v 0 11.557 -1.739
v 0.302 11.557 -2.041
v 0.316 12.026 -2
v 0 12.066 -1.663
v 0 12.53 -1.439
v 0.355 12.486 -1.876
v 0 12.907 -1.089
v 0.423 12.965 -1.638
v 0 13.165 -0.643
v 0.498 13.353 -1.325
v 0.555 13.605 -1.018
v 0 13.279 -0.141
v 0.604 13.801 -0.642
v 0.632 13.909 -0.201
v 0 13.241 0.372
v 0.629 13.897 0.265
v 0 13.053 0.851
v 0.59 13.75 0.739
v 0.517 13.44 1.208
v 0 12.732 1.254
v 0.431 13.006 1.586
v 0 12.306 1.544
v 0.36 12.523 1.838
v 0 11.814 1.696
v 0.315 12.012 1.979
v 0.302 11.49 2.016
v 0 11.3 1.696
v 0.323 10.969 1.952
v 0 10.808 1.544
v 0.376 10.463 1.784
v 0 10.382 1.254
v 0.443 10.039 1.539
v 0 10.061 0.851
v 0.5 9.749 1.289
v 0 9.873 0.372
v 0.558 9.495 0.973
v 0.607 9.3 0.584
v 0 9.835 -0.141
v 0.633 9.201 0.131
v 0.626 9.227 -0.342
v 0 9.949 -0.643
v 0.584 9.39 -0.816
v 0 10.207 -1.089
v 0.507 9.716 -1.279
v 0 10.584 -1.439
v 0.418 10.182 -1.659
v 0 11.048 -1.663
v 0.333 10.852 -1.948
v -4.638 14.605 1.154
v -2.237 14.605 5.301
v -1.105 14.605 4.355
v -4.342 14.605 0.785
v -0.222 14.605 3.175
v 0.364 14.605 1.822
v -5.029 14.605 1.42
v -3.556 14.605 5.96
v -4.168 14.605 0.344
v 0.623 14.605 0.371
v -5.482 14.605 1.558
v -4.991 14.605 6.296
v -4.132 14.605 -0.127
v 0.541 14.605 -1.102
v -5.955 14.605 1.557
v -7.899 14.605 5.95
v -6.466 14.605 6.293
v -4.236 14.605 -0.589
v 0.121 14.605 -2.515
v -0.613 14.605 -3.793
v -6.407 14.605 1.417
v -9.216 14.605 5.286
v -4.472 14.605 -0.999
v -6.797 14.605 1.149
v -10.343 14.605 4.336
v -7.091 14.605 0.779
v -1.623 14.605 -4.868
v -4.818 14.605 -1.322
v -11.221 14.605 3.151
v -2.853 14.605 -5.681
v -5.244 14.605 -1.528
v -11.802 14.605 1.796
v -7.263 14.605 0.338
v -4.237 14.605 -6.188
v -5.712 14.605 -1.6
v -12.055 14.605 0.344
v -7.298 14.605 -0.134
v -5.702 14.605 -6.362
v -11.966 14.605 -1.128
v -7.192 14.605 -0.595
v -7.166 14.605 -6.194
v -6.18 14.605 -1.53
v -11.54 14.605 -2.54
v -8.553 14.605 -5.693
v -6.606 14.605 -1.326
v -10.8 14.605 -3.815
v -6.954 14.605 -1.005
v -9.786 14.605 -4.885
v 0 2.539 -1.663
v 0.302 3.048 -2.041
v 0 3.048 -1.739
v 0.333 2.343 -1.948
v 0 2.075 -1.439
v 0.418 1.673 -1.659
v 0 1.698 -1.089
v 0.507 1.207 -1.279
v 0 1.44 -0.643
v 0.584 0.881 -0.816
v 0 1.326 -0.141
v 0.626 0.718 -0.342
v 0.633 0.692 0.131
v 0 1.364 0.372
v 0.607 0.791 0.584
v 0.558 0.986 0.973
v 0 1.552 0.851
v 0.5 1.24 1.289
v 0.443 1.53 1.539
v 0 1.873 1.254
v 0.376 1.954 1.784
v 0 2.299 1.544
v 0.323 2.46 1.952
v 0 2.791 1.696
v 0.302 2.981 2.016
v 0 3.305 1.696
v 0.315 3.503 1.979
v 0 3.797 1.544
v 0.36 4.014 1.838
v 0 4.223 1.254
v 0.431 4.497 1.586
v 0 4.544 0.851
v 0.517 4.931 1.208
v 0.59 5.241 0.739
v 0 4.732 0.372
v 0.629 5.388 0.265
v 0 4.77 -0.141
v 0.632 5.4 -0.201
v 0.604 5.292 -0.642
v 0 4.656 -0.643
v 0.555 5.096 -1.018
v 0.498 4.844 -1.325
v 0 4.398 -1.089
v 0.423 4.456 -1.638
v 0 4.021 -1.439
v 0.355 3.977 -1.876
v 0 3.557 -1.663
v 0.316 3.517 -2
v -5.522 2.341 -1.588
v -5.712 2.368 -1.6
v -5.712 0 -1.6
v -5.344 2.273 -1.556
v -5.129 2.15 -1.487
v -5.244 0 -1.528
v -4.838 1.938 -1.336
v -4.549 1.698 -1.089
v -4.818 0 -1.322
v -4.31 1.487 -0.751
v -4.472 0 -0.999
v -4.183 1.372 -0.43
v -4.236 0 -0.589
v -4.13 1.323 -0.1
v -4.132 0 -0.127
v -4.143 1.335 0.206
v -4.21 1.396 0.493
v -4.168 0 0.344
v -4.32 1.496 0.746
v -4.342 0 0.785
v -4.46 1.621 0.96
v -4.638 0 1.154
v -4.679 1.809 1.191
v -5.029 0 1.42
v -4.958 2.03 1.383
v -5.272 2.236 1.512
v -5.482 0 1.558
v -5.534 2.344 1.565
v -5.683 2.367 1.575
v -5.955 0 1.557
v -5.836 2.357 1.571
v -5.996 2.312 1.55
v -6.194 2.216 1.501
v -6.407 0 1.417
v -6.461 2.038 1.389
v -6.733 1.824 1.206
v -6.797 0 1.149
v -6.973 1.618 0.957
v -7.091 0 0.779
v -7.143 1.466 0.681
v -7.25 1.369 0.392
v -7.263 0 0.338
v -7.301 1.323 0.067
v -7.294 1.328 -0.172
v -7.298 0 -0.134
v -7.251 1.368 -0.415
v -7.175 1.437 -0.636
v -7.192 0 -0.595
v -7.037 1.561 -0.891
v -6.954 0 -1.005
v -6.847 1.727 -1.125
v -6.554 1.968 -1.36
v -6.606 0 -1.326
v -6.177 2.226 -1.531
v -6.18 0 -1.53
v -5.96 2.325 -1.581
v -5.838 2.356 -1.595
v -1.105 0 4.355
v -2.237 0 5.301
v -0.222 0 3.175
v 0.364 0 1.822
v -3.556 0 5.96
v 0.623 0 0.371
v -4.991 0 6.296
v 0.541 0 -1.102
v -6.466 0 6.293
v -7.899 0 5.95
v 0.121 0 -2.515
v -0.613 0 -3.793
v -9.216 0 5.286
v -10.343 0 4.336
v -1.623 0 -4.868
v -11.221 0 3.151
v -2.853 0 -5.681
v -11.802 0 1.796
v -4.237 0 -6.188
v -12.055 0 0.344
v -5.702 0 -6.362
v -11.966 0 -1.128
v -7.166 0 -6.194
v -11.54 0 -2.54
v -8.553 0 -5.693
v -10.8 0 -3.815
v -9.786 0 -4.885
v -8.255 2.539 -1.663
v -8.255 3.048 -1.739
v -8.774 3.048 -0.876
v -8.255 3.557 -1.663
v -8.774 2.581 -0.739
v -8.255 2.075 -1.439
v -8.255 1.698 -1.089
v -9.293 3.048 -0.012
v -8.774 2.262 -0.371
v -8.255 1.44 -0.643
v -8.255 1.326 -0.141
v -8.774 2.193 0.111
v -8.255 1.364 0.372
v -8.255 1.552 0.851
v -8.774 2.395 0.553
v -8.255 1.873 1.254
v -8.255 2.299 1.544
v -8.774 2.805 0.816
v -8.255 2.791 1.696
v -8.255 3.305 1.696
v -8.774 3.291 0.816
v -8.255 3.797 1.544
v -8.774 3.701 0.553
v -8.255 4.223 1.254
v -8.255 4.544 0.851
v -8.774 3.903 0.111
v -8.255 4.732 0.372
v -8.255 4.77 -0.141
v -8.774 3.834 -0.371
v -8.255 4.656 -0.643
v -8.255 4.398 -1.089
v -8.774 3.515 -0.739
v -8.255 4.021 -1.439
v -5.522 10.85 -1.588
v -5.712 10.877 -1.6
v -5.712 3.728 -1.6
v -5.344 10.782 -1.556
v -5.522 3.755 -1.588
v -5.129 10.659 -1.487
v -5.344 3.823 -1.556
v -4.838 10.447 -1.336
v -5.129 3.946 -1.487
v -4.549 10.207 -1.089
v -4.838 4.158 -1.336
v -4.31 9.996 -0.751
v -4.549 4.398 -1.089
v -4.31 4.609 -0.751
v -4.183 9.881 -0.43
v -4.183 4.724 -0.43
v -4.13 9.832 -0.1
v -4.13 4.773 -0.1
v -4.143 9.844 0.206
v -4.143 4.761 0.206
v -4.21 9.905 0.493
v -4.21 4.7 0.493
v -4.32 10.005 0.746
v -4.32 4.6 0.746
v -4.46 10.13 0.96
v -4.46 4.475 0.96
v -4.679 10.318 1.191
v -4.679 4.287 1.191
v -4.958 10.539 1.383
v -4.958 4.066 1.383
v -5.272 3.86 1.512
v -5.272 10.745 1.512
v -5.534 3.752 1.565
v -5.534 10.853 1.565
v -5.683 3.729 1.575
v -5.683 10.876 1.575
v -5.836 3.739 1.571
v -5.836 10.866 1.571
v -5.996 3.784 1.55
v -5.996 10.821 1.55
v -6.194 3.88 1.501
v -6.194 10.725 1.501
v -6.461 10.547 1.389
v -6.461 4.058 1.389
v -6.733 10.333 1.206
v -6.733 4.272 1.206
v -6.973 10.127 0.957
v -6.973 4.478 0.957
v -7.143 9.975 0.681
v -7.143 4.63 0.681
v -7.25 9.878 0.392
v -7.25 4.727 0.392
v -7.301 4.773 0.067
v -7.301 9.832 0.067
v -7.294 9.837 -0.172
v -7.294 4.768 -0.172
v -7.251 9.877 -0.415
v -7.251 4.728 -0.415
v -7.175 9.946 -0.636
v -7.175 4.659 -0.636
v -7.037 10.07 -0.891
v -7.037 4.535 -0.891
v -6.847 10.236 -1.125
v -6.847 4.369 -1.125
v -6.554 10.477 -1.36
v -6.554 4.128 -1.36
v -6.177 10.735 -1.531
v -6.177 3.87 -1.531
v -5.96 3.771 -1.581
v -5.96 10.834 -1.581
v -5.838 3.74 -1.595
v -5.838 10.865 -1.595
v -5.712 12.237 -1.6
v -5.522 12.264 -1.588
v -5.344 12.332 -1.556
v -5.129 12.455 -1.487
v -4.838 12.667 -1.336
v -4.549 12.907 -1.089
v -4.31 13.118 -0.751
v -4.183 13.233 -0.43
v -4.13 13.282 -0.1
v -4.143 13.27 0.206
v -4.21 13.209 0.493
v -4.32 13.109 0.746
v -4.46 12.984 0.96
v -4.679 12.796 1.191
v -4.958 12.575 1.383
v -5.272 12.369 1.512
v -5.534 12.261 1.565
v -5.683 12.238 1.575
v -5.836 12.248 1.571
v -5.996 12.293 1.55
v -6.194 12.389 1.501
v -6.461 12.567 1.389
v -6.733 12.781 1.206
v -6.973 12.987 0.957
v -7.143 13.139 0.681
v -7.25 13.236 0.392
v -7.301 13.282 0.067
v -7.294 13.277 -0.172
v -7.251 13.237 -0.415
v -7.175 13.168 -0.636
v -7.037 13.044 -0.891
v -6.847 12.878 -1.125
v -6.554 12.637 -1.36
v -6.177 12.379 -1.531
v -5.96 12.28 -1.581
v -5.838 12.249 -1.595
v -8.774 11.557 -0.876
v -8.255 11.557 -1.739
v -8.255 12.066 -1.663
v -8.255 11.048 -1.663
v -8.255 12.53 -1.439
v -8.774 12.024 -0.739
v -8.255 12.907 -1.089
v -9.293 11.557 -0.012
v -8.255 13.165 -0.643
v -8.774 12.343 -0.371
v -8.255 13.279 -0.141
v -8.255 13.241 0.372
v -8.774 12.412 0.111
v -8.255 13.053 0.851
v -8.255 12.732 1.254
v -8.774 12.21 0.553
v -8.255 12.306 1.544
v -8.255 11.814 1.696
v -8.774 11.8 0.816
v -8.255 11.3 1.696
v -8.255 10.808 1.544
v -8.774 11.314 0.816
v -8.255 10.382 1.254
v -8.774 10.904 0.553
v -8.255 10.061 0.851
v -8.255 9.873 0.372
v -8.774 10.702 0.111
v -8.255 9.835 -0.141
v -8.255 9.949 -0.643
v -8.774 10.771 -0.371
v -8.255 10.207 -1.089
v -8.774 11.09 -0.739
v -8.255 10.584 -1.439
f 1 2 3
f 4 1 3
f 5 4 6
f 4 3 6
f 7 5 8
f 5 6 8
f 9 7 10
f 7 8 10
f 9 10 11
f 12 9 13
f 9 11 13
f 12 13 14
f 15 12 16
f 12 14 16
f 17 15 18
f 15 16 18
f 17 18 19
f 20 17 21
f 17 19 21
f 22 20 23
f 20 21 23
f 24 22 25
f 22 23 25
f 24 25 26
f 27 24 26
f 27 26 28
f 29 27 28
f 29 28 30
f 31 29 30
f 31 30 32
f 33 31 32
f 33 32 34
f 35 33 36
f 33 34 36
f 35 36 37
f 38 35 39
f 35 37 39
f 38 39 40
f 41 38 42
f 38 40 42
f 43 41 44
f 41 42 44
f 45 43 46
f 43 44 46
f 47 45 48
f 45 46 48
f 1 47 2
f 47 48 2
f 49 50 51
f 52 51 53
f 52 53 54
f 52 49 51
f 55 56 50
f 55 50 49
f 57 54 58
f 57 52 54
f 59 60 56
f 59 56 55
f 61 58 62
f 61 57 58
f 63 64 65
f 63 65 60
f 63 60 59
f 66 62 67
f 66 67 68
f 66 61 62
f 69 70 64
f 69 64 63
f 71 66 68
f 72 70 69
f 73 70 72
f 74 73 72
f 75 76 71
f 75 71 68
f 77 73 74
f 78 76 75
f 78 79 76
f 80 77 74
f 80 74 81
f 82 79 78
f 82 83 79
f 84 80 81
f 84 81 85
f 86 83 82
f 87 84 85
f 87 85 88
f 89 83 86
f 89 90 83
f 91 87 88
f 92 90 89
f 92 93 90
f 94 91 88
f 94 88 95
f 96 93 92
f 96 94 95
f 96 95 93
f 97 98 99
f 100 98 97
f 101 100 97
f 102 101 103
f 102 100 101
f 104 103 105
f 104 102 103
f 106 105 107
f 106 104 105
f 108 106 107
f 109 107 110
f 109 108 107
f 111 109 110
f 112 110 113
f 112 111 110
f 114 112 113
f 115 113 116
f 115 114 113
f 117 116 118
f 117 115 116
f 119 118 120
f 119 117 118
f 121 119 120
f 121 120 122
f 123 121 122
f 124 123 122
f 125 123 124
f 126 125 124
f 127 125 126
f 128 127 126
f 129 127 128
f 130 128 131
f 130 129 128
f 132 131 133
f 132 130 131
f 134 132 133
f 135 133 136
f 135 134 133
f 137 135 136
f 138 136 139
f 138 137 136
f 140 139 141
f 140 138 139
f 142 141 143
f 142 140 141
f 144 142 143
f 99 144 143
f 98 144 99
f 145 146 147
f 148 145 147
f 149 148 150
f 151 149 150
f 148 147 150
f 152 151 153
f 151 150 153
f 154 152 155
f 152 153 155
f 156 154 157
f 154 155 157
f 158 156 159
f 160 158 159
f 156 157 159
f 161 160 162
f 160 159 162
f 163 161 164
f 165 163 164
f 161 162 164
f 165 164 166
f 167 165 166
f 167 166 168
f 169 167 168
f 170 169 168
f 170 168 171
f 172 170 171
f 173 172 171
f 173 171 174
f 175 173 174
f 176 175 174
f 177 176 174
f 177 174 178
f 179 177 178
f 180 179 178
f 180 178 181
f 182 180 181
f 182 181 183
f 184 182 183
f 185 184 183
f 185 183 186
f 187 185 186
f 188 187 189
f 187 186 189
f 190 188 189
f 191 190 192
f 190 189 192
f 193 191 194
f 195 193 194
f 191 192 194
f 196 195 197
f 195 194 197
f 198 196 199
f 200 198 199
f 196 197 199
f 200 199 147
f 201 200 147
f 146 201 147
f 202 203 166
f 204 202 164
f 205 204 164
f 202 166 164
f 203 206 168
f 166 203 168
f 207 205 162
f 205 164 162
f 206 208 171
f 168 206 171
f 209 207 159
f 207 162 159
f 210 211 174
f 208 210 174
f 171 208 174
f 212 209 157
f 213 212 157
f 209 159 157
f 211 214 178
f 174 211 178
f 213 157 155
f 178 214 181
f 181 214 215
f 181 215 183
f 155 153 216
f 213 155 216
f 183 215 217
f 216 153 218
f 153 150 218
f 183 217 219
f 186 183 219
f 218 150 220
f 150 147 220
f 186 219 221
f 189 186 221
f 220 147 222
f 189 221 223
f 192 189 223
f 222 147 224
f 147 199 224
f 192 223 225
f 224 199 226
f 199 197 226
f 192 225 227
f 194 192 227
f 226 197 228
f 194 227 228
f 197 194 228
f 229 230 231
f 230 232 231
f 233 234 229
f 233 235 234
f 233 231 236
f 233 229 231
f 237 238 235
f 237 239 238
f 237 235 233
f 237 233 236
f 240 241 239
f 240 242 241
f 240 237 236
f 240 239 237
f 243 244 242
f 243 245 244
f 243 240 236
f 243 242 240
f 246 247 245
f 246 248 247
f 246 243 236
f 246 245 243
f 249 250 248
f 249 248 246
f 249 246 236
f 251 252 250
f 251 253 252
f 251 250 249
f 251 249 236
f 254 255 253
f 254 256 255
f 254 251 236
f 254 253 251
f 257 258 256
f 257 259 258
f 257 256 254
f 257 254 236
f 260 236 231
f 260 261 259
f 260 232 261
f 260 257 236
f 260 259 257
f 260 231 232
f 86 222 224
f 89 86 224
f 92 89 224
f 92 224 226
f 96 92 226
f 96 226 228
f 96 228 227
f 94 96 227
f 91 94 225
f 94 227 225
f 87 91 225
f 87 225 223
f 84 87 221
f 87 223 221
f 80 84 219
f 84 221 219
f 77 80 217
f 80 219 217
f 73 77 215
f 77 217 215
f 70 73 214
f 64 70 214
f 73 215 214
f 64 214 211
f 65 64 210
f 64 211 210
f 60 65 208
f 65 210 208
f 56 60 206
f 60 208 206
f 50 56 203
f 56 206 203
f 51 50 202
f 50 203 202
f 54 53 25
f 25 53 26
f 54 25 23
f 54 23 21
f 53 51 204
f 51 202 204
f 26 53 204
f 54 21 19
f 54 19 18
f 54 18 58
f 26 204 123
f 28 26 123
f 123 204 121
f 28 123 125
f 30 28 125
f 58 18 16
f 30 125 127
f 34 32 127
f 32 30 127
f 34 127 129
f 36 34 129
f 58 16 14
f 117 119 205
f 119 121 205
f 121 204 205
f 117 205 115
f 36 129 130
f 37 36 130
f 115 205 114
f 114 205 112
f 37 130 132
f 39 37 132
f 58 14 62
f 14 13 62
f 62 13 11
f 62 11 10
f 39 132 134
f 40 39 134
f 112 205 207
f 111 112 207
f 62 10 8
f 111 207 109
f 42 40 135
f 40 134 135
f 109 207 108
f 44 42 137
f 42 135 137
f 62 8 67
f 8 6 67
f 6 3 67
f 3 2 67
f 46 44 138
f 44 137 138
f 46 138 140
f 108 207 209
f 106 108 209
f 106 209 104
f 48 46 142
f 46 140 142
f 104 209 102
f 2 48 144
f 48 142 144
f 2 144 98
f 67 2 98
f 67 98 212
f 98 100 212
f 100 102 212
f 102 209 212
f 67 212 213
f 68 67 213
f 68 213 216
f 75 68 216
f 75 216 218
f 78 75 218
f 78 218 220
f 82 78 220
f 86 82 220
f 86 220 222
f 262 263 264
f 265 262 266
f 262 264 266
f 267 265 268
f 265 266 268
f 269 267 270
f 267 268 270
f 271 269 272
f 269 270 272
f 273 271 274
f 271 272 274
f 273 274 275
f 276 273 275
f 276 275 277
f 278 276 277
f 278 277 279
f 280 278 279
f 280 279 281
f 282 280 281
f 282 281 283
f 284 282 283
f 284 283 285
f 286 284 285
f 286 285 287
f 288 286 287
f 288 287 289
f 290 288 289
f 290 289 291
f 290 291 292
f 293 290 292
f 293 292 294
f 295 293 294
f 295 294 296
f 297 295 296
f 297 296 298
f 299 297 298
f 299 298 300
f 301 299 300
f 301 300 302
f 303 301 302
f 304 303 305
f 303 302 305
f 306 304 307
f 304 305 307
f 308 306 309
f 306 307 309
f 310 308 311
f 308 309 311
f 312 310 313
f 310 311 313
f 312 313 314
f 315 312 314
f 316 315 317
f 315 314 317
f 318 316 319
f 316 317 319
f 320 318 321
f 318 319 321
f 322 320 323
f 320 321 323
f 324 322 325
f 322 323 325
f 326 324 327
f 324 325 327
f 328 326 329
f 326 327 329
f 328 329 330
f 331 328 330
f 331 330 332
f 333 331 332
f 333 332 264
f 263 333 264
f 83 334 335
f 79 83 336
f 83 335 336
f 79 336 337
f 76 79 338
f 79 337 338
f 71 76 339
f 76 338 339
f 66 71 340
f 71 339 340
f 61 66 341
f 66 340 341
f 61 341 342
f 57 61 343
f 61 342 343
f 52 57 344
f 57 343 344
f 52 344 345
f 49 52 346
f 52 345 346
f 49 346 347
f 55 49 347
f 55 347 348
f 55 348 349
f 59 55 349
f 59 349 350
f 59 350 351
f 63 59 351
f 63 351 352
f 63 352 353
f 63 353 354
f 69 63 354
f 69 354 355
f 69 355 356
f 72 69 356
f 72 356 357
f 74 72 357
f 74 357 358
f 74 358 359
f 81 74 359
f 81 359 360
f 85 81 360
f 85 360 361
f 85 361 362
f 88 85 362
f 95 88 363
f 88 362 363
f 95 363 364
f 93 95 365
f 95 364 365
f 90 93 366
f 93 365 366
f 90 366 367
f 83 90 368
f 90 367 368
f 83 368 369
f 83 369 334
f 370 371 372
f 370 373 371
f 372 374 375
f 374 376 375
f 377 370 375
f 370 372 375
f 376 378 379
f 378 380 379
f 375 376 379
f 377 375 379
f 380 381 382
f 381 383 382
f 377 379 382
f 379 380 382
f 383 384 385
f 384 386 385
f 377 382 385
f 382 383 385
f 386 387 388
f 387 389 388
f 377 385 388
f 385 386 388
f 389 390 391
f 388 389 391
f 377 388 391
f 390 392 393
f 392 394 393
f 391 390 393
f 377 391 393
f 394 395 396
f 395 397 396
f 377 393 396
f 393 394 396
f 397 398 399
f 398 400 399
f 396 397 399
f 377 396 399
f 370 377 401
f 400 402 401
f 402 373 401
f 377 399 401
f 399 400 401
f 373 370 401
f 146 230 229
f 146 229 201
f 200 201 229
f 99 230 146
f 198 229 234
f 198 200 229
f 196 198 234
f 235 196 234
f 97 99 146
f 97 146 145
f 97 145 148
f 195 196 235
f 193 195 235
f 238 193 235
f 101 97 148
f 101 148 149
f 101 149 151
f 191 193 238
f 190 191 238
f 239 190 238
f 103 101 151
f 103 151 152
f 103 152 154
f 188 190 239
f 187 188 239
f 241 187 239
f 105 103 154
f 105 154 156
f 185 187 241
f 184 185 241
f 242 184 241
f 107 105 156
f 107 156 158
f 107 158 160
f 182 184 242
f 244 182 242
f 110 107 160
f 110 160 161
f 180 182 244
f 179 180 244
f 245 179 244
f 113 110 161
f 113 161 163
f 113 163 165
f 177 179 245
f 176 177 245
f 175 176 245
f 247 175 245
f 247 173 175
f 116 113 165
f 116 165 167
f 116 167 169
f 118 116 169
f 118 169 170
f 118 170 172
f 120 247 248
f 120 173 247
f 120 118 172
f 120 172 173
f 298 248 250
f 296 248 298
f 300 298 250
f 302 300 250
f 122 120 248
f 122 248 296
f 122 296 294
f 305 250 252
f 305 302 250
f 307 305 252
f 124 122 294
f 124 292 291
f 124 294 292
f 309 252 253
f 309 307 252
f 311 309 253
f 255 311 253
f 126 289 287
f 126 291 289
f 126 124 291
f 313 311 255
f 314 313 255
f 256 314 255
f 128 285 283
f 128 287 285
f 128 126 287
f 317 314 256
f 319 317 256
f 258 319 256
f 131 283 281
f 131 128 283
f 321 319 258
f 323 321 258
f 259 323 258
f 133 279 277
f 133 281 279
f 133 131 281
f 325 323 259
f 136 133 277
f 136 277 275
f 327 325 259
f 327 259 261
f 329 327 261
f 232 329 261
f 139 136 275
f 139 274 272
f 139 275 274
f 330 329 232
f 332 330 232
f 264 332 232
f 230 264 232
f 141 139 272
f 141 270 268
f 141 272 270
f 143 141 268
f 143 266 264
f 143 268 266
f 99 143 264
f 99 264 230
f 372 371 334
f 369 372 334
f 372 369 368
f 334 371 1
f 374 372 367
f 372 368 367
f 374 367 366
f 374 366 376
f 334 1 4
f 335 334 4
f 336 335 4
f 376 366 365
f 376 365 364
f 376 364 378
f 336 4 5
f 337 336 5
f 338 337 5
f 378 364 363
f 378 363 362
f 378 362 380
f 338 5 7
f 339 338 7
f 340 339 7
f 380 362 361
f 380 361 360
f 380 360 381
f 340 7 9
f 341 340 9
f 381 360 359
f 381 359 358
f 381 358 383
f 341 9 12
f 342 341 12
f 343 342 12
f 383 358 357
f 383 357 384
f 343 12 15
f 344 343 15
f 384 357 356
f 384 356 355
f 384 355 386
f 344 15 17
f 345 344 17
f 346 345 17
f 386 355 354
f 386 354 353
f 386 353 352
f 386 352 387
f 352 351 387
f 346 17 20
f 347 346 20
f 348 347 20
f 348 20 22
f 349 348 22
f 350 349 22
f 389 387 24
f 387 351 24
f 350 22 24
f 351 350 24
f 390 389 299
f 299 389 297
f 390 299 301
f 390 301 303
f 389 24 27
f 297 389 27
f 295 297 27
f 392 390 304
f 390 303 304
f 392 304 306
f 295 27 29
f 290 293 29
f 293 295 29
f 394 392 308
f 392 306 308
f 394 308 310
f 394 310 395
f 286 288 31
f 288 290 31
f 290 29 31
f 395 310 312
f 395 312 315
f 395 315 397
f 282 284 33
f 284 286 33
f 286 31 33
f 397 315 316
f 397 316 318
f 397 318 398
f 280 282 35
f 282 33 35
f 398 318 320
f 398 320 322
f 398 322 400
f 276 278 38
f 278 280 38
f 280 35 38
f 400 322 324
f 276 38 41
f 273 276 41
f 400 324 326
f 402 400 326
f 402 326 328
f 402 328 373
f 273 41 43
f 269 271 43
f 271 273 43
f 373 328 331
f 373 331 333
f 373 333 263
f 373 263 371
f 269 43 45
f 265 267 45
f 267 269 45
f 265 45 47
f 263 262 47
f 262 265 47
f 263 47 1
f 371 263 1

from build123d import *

# Parameters (mm, degrees)
SKETCH1_R             = 6.35
BOSS_EXTRUDE1_DEPTH   = 14.605
SKETCH2_R             = 1.5875
CUT_EXTRUDE1_DEPTH    = 18.145
BODY_MOVE_COPY3_ANGLE = 0.1216002


with BuildPart() as part:
    # Sketch1 → Boss-Extrude1 (new body)
    with BuildSketch(Plane(origin=(0, 0, 0), x_dir=(1, 0, 0), z_dir=(0, 1, 0))):
        with Locations(Location((0, 0, 0), (0, 0, 90))):
            Circle(SKETCH1_R)
    extrude(amount=BOSS_EXTRUDE1_DEPTH)

    # Sketch2 → Cut-Extrude1 (cut, through all)
    with BuildSketch(Plane(origin=(0, 0, 0), x_dir=(-1, 0, 0), z_dir=(0, -1, 0))):
        with Locations(Location((0, 0, 0), (0, 0, 90))):
            Circle(SKETCH2_R)
    extrude(amount=-CUT_EXTRUDE1_DEPTH, mode=Mode.SUBTRACT)

    # Sketch16 → #8-32 Tapped Hole3 (revolve, cut)
    with BuildSketch(Plane(origin=(6.349985699, 3.048, -0.013476749), x_dir=(-0.002122322633644313, 0, -0.9999977478707834), z_dir=(0, 1, 0))):
        Polygon((0, 0), (0, 9.927806461), (1.7272, 8.89), (1.7272, 0.635), (2.3622, 0), align=None)
    f_8_32_tapped_hole3 = revolve(axis=Axis((12.699971398, 3.048, -0.026953497), (-0.9999977478707834, 0, 0.002122322633644313)), mode=Mode.SUBTRACT)

    # Mirror2: #8-32 Tapped Hole3 across plane
    add(f_8_32_tapped_hole3.mirror(Plane.ZX.offset(7.3025)), mode=Mode.SUBTRACT)


with BuildPart() as part_1:
    # Body-Move/Copy3: read off the stored shape, not the designer's step
    # Body-Move/Copy3: moved
    add(part.part.moved(Location((-5.7150129, 0, 0))).rotate(Axis((0, 0, 0), (0, -1, 0)), BODY_MOVE_COPY3_ANGLE))


solid = part_1.part
